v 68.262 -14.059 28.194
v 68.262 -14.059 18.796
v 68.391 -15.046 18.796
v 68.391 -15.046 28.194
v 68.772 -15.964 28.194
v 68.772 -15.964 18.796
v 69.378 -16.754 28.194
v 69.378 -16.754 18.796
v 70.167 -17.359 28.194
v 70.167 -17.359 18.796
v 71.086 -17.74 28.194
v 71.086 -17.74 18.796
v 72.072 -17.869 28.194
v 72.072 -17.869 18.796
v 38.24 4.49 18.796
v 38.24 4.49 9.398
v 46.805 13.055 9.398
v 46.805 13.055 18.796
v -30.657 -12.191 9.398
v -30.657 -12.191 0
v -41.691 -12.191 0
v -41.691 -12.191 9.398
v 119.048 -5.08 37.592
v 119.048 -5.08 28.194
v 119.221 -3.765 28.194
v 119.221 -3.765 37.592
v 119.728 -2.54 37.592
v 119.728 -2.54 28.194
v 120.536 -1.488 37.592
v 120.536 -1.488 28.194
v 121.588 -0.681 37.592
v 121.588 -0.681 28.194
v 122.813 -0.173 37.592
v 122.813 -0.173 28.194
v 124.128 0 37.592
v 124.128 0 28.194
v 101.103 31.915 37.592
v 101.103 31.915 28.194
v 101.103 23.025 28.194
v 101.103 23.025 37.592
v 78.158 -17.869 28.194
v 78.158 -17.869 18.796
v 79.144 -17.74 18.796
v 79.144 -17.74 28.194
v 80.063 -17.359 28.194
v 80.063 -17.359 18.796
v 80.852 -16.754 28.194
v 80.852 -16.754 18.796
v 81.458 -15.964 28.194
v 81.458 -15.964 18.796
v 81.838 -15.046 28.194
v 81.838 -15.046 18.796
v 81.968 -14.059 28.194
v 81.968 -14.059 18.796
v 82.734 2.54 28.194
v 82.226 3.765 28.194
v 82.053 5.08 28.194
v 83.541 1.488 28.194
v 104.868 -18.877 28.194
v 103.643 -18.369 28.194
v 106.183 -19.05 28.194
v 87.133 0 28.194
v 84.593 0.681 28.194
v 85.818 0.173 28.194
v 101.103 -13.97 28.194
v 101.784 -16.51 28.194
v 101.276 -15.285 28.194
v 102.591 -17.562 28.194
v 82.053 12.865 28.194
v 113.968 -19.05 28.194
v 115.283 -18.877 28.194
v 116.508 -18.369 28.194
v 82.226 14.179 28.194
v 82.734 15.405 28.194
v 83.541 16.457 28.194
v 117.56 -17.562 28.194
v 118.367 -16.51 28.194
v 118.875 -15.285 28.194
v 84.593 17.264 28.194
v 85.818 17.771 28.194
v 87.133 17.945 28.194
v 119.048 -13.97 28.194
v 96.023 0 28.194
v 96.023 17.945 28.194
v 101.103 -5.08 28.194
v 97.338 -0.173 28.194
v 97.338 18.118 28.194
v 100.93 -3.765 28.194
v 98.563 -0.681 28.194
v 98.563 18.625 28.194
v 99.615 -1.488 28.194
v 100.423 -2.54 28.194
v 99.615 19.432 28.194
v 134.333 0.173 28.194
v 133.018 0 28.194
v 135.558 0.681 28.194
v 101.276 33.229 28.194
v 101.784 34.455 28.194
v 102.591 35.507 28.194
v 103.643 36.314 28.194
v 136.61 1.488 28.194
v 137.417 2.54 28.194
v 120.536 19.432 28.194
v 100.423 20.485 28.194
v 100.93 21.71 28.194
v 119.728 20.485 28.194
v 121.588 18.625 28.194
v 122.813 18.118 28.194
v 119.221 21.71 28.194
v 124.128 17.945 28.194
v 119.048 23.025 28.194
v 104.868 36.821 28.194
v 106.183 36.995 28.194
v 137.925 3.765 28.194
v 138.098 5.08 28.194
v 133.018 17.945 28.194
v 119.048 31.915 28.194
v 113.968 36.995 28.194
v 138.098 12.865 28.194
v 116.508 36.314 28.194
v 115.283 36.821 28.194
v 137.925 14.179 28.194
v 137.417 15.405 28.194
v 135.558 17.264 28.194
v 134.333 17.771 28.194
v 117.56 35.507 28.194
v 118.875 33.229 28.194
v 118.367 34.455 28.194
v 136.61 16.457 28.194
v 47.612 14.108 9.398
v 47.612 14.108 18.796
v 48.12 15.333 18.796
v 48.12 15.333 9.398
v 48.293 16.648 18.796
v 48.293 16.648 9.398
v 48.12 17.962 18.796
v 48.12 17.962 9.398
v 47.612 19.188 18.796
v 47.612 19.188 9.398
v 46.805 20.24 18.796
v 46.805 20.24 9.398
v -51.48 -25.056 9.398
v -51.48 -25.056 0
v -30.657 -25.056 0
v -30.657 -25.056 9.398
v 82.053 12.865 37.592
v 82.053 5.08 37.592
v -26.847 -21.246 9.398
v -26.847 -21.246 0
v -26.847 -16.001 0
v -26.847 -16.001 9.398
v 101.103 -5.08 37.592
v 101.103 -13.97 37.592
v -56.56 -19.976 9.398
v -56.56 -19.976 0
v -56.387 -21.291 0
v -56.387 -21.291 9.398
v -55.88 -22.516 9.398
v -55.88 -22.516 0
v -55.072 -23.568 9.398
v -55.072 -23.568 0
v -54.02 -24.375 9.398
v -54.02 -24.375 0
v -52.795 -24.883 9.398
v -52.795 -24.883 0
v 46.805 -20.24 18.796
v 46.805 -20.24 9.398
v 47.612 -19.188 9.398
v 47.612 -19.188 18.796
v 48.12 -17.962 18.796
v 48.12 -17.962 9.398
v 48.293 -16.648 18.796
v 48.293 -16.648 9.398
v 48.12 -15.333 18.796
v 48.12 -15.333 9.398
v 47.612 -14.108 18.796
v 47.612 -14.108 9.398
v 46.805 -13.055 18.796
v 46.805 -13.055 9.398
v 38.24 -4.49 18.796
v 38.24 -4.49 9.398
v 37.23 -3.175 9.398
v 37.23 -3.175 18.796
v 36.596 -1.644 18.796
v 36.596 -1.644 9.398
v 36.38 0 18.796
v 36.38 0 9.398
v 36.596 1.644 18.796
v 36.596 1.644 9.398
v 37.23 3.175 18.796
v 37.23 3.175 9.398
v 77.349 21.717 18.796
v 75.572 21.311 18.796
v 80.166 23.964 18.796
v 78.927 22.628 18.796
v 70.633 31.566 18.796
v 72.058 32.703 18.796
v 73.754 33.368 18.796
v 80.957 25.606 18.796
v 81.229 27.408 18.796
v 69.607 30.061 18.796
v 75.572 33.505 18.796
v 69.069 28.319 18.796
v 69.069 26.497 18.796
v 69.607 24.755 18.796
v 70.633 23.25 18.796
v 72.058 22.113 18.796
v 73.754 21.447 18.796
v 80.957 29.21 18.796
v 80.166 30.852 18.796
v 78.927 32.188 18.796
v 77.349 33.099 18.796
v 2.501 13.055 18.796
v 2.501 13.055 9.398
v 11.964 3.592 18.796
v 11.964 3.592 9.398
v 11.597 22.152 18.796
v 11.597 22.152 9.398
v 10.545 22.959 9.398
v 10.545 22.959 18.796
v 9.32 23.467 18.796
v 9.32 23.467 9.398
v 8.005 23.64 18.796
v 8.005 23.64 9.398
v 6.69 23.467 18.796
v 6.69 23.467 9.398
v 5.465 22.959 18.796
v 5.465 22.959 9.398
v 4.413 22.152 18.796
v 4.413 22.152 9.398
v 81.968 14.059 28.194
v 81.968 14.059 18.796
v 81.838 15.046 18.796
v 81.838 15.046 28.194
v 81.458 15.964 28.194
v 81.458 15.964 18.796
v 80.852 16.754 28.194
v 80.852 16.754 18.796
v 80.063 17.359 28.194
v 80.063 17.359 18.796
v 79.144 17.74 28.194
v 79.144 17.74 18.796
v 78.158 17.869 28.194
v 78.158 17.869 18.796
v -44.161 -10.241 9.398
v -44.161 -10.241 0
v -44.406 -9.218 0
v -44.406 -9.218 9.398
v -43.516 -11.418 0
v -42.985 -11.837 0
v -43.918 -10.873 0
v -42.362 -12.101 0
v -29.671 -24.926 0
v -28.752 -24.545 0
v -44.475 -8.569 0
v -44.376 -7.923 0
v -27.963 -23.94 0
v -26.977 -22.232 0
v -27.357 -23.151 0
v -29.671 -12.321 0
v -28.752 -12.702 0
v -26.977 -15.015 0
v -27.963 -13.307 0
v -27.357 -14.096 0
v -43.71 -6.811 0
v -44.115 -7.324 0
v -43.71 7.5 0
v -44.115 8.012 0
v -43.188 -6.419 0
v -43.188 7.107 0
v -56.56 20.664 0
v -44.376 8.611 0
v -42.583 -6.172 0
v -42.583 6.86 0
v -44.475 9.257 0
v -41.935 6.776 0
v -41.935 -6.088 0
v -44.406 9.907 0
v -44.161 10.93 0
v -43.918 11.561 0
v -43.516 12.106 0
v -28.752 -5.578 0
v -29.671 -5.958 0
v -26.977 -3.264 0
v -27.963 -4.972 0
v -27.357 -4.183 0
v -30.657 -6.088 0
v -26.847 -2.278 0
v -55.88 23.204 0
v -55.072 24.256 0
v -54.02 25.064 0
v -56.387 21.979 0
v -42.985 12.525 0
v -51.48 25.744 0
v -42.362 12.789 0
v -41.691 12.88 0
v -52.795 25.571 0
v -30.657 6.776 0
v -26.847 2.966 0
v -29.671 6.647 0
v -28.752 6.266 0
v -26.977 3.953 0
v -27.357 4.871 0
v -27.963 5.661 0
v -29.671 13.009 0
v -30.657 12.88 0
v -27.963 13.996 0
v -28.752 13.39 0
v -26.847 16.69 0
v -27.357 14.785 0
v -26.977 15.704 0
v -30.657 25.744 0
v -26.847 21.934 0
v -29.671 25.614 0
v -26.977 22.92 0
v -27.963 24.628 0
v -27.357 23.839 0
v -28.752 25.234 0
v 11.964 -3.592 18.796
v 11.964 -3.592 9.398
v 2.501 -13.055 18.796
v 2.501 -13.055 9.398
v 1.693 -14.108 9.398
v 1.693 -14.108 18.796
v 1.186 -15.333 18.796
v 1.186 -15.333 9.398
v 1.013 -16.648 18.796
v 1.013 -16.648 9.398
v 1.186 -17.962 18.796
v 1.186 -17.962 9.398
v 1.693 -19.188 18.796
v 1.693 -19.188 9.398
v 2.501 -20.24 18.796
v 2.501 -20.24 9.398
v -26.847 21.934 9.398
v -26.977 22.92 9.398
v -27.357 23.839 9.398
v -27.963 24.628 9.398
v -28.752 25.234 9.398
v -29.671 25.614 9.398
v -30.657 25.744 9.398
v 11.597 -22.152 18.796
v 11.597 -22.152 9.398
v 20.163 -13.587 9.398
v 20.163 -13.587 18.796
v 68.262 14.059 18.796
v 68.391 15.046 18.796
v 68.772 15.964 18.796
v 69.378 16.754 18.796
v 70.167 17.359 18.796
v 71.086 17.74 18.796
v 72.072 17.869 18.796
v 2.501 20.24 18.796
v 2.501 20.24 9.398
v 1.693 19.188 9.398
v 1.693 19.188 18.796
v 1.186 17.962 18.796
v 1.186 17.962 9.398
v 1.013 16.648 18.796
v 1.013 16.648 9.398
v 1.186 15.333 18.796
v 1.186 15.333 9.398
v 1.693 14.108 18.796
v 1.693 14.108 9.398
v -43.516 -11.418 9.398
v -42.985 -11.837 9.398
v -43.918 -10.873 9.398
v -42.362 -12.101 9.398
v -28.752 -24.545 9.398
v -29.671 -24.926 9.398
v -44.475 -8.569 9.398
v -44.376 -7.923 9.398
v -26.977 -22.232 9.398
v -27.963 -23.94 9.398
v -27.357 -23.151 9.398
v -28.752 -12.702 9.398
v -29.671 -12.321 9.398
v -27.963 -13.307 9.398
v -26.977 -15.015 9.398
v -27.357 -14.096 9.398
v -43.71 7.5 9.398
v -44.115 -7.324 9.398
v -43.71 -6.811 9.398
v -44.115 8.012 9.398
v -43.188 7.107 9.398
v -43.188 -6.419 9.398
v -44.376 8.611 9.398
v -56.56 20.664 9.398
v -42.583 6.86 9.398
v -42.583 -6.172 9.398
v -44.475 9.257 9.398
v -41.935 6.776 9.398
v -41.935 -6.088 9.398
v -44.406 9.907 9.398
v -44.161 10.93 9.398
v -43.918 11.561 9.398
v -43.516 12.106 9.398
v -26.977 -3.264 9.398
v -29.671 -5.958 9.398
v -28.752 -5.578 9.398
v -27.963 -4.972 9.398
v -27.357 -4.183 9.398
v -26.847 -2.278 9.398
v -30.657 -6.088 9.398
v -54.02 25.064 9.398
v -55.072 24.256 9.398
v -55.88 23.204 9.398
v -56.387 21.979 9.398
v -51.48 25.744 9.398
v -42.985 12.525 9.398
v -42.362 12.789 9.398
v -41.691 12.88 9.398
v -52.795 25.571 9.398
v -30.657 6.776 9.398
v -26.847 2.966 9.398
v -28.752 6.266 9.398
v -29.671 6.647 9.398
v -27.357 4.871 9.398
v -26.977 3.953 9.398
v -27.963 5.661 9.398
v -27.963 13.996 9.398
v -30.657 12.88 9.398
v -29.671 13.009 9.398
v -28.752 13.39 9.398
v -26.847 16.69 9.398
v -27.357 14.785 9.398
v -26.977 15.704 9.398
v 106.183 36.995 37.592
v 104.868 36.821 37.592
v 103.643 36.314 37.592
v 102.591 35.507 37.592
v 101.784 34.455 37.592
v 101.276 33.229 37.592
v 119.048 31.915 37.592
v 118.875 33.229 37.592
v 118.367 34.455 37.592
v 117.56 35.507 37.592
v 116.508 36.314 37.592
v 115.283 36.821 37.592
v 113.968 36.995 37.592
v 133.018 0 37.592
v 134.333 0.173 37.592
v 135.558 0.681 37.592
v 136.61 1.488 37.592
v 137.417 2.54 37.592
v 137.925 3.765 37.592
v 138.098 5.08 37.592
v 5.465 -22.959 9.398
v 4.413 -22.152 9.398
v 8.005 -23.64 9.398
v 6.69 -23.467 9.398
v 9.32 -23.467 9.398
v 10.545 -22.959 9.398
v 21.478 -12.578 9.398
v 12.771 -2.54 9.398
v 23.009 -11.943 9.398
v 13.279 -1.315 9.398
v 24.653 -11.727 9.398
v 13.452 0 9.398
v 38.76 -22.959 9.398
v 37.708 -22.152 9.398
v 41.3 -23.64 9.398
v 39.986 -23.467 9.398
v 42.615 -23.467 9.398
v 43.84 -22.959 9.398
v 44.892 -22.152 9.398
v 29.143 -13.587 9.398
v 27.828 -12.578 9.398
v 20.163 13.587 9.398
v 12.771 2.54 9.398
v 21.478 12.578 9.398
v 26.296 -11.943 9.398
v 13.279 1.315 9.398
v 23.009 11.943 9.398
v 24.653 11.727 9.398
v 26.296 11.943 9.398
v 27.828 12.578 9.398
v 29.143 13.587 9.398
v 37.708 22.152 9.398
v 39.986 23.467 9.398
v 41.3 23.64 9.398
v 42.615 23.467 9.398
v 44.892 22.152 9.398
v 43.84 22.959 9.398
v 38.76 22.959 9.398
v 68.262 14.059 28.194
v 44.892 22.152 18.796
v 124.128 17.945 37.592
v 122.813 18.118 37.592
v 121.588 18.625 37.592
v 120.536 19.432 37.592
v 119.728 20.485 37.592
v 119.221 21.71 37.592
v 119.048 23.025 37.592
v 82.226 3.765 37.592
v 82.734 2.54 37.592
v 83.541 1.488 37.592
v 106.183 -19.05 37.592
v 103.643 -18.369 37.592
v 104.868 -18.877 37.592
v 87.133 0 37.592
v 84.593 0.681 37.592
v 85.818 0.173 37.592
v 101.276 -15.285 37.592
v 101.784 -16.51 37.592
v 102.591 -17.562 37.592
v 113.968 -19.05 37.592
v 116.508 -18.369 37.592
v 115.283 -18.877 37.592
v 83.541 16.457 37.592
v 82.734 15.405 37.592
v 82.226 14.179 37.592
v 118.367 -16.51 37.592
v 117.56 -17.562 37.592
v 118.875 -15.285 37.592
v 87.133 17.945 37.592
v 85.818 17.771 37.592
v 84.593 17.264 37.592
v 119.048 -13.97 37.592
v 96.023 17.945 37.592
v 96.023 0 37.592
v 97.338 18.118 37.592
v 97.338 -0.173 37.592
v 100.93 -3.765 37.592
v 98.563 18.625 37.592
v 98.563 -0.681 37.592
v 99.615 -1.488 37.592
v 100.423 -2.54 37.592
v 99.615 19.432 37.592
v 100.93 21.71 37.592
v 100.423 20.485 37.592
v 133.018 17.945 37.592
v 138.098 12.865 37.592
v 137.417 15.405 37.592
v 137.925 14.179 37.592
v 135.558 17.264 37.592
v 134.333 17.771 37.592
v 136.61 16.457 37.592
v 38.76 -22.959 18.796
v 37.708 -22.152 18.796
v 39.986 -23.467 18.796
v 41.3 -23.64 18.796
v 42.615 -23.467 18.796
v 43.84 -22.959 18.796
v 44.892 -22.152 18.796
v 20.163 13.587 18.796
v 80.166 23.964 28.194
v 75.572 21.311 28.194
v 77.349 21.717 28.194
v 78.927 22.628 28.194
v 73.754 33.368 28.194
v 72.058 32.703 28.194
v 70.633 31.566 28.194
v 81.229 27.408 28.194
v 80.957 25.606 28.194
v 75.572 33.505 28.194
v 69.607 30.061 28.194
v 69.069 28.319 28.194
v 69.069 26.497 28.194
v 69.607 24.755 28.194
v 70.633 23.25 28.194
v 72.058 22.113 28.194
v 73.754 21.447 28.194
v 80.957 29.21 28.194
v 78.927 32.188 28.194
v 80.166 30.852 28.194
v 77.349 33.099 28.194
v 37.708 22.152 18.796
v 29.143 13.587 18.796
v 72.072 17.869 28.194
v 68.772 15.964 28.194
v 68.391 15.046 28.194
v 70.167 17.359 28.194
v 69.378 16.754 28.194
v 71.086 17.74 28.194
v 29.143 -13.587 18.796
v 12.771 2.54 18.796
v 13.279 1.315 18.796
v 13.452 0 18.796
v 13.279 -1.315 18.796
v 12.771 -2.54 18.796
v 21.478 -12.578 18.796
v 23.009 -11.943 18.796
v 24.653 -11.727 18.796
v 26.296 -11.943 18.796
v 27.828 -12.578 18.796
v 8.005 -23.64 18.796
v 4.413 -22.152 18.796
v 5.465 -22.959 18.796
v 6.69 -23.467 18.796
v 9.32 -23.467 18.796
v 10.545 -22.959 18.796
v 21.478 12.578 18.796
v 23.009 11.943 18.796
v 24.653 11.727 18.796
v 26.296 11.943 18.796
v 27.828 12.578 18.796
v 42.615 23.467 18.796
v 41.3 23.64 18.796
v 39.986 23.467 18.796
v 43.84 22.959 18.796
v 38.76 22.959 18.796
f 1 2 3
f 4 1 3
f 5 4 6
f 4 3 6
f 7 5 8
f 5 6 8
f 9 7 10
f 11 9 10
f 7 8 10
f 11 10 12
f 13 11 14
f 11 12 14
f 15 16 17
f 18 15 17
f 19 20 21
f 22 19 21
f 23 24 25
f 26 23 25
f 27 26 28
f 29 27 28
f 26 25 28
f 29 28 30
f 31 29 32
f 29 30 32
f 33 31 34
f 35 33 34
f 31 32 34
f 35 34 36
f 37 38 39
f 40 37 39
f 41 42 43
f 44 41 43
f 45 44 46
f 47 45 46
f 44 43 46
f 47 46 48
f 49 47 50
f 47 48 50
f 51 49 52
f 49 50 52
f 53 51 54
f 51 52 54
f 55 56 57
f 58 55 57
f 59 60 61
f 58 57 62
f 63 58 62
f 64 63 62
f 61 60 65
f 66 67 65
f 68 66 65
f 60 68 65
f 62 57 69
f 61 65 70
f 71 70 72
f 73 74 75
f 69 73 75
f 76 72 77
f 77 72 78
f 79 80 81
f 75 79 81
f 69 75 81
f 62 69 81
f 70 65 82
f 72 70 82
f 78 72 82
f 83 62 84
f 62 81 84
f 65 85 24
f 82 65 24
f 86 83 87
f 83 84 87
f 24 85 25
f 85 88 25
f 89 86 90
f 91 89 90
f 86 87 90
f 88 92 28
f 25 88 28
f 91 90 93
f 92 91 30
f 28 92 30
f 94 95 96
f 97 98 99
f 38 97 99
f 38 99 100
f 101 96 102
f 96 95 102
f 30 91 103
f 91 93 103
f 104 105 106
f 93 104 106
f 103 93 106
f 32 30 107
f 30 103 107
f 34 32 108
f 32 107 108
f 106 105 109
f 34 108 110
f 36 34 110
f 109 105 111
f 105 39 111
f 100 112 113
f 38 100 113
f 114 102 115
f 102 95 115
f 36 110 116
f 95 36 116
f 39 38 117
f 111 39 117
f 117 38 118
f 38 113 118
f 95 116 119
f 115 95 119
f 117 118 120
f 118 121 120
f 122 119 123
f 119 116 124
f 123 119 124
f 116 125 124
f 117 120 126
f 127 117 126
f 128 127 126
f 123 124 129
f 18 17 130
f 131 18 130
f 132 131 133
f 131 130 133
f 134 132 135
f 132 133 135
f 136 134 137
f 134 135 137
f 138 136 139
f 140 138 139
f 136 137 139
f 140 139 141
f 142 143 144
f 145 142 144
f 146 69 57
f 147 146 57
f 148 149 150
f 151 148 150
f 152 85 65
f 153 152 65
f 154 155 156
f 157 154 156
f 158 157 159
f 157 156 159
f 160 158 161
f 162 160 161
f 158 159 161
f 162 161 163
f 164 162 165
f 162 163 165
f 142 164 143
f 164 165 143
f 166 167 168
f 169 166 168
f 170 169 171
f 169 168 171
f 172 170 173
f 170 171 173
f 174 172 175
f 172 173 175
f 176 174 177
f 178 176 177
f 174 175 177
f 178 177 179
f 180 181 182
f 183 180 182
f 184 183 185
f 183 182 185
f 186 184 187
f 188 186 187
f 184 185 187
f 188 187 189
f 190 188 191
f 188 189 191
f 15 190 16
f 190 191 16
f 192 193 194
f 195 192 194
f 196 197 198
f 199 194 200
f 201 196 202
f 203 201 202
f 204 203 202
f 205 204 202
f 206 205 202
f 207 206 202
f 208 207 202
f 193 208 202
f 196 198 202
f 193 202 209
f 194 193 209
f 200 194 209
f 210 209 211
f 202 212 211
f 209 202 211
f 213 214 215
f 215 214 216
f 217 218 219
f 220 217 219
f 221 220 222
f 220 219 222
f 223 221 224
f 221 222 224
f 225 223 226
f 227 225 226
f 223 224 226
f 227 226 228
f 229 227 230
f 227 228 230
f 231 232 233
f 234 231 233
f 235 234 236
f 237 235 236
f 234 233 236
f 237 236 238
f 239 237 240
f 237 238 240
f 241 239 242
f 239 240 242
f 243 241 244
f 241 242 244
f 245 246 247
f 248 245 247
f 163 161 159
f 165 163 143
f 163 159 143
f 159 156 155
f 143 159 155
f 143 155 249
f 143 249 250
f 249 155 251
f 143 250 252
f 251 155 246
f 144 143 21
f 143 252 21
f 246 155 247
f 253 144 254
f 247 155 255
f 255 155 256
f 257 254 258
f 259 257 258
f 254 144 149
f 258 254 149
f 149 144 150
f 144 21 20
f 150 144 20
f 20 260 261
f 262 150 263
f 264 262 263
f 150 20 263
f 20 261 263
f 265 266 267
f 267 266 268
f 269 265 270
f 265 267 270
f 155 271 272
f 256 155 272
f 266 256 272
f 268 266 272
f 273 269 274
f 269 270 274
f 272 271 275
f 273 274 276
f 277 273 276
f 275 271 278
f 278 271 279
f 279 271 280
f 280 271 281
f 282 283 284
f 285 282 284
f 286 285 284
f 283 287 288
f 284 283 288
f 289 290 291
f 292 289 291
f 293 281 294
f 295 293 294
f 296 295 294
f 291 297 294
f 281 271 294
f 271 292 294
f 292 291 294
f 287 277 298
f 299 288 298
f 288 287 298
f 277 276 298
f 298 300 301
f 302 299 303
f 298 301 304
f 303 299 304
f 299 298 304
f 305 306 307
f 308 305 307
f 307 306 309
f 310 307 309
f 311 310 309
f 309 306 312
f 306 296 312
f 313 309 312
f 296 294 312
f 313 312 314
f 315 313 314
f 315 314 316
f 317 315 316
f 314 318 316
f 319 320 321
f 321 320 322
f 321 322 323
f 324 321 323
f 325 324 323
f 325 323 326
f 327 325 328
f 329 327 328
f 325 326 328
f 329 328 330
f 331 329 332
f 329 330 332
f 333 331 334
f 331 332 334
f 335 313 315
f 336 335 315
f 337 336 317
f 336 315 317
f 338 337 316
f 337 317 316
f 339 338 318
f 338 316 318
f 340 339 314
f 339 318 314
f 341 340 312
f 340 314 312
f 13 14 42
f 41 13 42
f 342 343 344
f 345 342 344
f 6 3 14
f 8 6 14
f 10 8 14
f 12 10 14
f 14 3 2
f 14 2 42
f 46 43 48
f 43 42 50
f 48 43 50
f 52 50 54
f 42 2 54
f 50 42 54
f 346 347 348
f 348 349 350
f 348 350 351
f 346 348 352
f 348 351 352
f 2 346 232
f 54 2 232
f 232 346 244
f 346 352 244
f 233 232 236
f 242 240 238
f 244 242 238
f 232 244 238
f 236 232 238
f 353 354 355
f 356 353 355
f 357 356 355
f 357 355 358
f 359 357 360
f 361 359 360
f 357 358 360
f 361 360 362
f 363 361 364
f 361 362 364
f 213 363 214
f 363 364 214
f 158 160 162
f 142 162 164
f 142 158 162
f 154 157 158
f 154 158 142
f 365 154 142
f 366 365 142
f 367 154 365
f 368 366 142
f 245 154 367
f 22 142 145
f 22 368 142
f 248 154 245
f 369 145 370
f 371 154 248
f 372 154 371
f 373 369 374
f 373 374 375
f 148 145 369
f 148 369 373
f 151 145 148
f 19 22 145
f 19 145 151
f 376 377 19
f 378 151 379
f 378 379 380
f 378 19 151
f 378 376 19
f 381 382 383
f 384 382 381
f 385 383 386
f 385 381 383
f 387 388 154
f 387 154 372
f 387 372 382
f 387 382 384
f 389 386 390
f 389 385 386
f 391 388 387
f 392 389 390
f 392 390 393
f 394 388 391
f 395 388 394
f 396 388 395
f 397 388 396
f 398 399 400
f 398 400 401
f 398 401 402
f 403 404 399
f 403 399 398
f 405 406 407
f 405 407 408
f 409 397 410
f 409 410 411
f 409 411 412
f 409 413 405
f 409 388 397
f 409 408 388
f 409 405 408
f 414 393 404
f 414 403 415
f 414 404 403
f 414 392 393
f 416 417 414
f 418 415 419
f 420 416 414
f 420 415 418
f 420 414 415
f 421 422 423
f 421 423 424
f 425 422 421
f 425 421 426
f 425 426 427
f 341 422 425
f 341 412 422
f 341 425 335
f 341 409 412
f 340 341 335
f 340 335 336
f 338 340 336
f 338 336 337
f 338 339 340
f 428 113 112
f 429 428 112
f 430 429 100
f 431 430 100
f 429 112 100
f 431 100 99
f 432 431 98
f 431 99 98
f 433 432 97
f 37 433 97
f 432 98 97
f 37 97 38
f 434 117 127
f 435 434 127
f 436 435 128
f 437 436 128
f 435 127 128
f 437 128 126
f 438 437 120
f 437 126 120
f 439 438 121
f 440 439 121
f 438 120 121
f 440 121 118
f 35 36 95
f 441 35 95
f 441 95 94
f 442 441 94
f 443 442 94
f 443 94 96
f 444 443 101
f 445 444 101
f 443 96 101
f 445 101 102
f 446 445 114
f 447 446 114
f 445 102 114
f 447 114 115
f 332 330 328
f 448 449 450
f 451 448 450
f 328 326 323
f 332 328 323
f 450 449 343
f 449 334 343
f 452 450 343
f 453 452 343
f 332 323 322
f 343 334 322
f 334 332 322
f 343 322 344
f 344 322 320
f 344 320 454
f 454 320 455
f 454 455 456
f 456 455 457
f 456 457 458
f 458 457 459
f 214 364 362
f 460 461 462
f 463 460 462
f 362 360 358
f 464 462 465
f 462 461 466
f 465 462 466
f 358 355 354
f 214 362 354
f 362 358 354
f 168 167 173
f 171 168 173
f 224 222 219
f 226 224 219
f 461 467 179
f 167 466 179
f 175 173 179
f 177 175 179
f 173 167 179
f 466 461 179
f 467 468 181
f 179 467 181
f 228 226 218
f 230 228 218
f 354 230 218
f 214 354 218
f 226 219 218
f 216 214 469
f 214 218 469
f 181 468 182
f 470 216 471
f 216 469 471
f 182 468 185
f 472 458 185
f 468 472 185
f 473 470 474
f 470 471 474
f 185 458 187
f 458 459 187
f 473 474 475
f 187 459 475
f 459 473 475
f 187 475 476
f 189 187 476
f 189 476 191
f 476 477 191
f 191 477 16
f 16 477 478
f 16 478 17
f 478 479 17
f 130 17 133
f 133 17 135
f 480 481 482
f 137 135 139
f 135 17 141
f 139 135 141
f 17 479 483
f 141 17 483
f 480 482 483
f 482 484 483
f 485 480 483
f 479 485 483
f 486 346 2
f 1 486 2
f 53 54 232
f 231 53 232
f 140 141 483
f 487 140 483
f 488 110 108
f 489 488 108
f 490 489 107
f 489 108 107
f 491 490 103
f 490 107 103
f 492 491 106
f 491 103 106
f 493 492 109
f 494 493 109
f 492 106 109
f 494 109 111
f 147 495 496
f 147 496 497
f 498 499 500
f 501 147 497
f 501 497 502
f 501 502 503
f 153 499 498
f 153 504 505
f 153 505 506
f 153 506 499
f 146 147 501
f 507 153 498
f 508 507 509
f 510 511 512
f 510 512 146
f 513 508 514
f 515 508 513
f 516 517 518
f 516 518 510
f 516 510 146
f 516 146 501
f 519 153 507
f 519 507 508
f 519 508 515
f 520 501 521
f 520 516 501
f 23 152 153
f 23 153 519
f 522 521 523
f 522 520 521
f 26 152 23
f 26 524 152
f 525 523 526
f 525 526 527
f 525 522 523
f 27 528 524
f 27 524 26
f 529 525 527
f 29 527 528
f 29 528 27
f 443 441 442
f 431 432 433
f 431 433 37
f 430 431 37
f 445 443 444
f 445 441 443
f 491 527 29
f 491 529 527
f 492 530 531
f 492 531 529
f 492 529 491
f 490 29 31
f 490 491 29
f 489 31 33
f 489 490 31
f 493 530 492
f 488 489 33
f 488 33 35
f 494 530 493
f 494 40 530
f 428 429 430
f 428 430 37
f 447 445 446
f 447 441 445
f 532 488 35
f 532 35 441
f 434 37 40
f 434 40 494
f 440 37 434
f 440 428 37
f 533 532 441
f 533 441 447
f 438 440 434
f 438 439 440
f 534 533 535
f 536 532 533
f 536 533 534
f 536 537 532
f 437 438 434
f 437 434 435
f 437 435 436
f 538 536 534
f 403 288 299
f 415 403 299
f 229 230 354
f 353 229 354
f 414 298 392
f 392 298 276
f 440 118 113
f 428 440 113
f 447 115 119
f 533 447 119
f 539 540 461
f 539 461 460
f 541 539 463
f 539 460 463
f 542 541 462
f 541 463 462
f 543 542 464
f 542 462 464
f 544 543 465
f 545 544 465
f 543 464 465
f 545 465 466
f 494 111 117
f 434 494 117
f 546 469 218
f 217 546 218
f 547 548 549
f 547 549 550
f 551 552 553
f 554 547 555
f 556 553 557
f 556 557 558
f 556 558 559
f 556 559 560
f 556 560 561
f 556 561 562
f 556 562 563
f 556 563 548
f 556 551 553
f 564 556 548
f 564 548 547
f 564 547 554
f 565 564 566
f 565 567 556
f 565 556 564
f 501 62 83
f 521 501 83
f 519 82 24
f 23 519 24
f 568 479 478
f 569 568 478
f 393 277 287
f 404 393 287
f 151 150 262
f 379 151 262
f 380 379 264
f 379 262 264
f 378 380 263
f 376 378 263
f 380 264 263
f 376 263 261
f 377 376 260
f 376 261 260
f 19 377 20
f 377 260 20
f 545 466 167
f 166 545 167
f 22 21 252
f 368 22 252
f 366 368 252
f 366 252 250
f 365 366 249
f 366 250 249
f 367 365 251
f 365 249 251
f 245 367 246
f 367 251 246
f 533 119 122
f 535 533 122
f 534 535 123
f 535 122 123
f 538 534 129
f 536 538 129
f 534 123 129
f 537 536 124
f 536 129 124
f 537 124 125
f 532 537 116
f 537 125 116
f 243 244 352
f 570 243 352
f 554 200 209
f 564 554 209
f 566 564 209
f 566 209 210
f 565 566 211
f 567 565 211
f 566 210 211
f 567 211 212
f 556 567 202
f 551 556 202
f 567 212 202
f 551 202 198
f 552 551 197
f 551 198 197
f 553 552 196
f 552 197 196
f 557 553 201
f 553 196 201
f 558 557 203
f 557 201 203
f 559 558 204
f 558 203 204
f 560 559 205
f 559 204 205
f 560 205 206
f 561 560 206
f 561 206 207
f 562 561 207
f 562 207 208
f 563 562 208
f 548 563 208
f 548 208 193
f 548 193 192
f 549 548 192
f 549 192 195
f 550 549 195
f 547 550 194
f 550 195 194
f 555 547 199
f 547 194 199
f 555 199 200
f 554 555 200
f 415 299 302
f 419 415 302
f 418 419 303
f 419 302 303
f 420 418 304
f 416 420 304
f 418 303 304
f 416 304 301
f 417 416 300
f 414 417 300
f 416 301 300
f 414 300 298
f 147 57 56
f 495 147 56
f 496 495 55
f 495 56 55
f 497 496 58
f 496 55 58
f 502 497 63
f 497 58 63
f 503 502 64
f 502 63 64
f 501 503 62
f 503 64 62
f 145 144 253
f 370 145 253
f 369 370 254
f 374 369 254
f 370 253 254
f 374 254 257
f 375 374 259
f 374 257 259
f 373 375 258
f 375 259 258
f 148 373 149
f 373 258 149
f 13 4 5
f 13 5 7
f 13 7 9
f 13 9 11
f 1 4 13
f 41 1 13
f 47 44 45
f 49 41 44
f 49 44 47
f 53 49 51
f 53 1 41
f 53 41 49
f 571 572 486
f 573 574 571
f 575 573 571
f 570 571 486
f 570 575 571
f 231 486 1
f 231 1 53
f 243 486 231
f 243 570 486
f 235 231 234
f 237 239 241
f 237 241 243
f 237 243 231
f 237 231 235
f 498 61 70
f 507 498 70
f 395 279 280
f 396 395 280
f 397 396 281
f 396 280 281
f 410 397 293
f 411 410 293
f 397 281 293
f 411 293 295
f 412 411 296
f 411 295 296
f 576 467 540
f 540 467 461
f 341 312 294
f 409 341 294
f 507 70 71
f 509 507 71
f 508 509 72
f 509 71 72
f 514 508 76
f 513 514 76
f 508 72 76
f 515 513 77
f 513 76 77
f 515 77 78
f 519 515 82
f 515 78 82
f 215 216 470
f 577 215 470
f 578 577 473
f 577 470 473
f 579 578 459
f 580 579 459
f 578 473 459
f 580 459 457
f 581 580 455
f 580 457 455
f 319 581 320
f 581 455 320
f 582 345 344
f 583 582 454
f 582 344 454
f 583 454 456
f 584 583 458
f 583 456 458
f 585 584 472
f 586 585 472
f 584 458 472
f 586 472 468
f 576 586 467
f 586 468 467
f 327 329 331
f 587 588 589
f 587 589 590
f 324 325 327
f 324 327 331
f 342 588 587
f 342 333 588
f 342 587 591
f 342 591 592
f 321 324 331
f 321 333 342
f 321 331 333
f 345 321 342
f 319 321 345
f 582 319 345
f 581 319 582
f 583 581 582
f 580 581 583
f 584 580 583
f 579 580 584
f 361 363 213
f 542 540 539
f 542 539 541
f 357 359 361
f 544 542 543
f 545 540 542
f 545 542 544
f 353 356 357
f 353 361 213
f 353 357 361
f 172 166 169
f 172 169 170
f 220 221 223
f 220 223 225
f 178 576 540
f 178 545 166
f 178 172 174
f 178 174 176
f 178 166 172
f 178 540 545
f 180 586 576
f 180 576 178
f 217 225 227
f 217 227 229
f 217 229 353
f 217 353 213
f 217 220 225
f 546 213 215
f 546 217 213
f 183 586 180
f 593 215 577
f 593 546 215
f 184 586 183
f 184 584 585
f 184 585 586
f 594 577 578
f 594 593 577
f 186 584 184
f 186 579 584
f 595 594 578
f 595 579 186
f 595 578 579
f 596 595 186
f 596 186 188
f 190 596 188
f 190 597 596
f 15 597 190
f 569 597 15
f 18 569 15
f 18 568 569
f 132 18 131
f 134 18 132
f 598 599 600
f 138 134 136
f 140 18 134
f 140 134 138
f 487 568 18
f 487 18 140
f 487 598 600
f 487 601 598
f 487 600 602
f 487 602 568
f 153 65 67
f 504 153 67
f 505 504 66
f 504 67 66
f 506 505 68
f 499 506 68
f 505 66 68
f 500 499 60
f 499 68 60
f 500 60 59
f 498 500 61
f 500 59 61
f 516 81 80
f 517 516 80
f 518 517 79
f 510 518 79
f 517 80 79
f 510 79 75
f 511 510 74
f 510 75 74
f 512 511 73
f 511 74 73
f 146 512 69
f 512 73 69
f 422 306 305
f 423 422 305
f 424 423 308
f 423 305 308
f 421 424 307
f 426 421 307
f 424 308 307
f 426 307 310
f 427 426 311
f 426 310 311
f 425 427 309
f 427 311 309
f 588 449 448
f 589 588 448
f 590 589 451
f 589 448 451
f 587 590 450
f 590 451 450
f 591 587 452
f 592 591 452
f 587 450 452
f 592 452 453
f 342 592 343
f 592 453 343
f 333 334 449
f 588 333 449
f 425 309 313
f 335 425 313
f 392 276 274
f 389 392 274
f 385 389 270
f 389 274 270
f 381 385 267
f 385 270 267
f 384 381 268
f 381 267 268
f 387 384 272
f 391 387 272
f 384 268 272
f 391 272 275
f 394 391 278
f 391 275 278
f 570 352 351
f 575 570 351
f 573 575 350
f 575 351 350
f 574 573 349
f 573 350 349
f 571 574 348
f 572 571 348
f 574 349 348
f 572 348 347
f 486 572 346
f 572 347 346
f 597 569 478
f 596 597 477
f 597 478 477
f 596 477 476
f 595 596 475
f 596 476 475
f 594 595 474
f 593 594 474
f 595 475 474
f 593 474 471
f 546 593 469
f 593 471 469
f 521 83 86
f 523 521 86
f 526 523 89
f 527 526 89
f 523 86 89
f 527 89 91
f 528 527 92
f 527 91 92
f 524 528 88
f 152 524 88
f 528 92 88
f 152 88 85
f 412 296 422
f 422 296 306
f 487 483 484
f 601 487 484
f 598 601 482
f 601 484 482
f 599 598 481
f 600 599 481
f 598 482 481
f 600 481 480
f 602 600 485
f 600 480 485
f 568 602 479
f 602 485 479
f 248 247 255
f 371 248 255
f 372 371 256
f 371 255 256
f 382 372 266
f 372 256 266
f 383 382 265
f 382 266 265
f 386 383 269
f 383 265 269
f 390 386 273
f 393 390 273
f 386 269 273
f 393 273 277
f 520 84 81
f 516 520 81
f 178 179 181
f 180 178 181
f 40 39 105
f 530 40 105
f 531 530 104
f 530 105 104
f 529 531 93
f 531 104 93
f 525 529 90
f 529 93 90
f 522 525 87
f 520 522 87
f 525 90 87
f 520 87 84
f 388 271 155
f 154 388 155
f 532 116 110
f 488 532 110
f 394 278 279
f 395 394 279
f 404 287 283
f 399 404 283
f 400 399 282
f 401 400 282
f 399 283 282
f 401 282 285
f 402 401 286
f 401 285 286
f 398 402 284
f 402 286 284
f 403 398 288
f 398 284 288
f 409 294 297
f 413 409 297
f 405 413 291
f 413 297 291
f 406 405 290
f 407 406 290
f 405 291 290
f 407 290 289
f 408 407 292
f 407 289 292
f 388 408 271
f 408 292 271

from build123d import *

# Parameters (mm, degrees)
F1_DEPTH = 9.398
F3_DEPTH = 9.398
F5_DEPTH = 9.398
F4_R     = 6.113799
F6_DEPTH = 9.398
F8_DEPTH = 9.398


with BuildPart() as f1:
    # F0 (on Top) → F1 (new body)
    with BuildSketch(Plane.XY):
        with BuildLine():
            Line((-56.560311, 20.664202), (-56.560311, 0.344202))
            Line((-56.560311, 0.344202), (-56.560311, -19.975798))
            ThreePointArc((-56.560311, -19.975798), (-55.072414, -23.5679), (-51.480311, -25.055798))
            Line((-51.480311, -25.055798), (-30.656733, -25.055798))
            ThreePointArc((-30.656733, -25.055798), (-27.962656, -23.939875), (-26.846733, -21.245798))
            Line((-26.846733, -21.245798), (-26.846733, -16.001206))
            ThreePointArc((-26.846733, -16.001206), (-27.962656, -13.307129), (-30.656733, -12.191206))
            Line((-30.656733, -12.191206), (-41.690991, -12.191206))
            ThreePointArc((-41.690991, -12.191206), (-43.264629, -11.645012), (-44.161486, -10.241334))
            Line((-44.161486, -10.241334), (-44.405878, -9.218222))
            ThreePointArc((-44.405878, -9.218222), (-43.929189, -7.054456), (-41.935382, -6.088094))
            Line((-41.935382, -6.088094), (-30.656733, -6.088094))
            ThreePointArc((-30.656733, -6.088094), (-27.962656, -4.97217), (-26.846733, -2.278094))
            Line((-26.846733, -2.278094), (-26.846733, 2.966498))
            ThreePointArc((-26.846733, 2.966498), (-27.962656, 5.660575), (-30.656733, 6.776498))
            Line((-30.656733, 6.776498), (-41.935383, 6.776498))
            ThreePointArc((-41.935383, 6.776498), (-43.929189, 7.74286), (-44.405879, 9.906626))
            Line((-44.405879, 9.906626), (-44.161486, 10.929747))
            ThreePointArc((-44.161486, 10.929747), (-43.264629, 12.333425), (-41.69099, 12.879619))
            Line((-41.69099, 12.879619), (-30.656733, 12.879619))
            ThreePointArc((-30.656733, 12.879619), (-27.962656, 13.995542), (-26.846733, 16.689619))
            Line((-26.846733, 16.689619), (-26.846733, 21.934202))
            ThreePointArc((-26.846733, 21.934202), (-27.962656, 24.628279), (-30.656733, 25.744202))
            Line((-30.656733, 25.744202), (-51.480311, 25.744202))
            ThreePointArc((-51.480311, 25.744202), (-55.072414, 24.256305), (-56.560311, 20.664202))
        make_face()
    extrude(amount=F1_DEPTH)


with BuildPart() as f3:
    # F2 (on face) → F3 (new body)
    with BuildSketch(Plane.XY.offset(9.398)):
        with BuildLine():
            ThreePointArc((11.5973, 22.1521), (8.005198, 23.639997), (4.413095, 22.1521))
            Line((4.413095, 22.1521), (2.50066, 20.239664))
            ThreePointArc((2.50066, 20.239664), (1.012762, 16.647562), (2.50066, 13.05546))
            Line((2.50066, 13.05546), (11.964017, 3.592102))
            ThreePointArc((11.964017, 3.592102), (13.451915, 0), (11.964017, -3.592102))
            Line((11.964017, -3.592102), (2.50066, -13.05546))
            ThreePointArc((2.50066, -13.05546), (1.012762, -16.647562), (2.50066, -20.239664))
            Line((2.50066, -20.239664), (4.413095, -22.1521))
            ThreePointArc((4.413095, -22.1521), (8.005198, -23.639997), (11.5973, -22.1521))
            Line((11.5973, -22.1521), (20.162632, -13.586768))
            ThreePointArc((20.162632, -13.586768), (24.65276, -11.726896), (29.142888, -13.586768))
            Line((29.142888, -13.586768), (37.708219, -22.1521))
            ThreePointArc((37.708219, -22.1521), (41.300322, -23.639997), (44.892424, -22.1521))
            Line((44.892424, -22.1521), (46.80486, -20.239664))
            ThreePointArc((46.80486, -20.239664), (48.292757, -16.647562), (46.80486, -13.05546))
            Line((46.80486, -13.05546), (38.239528, -4.490128))
            ThreePointArc((38.239528, -4.490128), (36.379656, 0), (38.239528, 4.490128))
            Line((38.239528, 4.490128), (46.80486, 13.05546))
            ThreePointArc((46.80486, 13.05546), (48.292757, 16.647562), (46.80486, 20.239664))
            Line((46.80486, 20.239664), (44.892424, 22.1521))
            ThreePointArc((44.892424, 22.1521), (41.300322, 23.639997), (37.708219, 22.1521))
            Line((37.708219, 22.1521), (29.142888, 13.586768))
            ThreePointArc((29.142888, 13.586768), (24.65276, 11.726896), (20.162632, 13.586768))
            Line((20.162632, 13.586768), (11.5973, 22.1521))
        make_face()
    extrude(amount=F3_DEPTH)


with BuildPart() as f5:
    # F4 (on face) → F5 (new body)
    with BuildSketch(Plane.XY.offset(18.796)):
        with BuildLine():
            Line((78.158188, 17.869434), (72.071638, 17.869434))
            ThreePointArc((72.071638, 17.869434), (69.377561, 16.753511), (68.261638, 14.059434))
            Line((68.261638, 14.059434), (68.261638, -14.059434))
            ThreePointArc((68.261638, -14.059434), (69.377561, -16.753511), (72.071638, -17.869434))
            Line((72.071638, -17.869434), (78.158188, -17.869434))
            ThreePointArc((78.158188, -17.869434), (80.852265, -16.753511), (81.968188, -14.059434))
            Line((81.968188, -14.059434), (81.968188, 14.059434))
            ThreePointArc((81.968188, 14.059434), (80.852265, 16.753511), (78.158188, 17.869434))
        make_face()
    extrude(amount=F5_DEPTH)


with BuildPart() as f6:
    # F4 (on face) → F6 (new body)
    with BuildSketch(Plane.XY.offset(18.796)):
        with Locations((75.114913, 27.407957)):
            Circle(F4_R)
    extrude(amount=F6_DEPTH)


with BuildPart() as f8:
    # F7 (on face) → F8 (new body)
    with BuildSketch(Plane.XY.offset(28.194)):
        with BuildLine():
            ThreePointArc((106.183127, 36.994592), (102.591025, 35.506694), (101.103127, 31.914592))
            Line((101.103127, 31.914592), (101.103127, 23.024592))
            ThreePointArc((101.103127, 23.024592), (99.615229, 19.43249), (96.023127, 17.944592))
            Line((96.023127, 17.944592), (87.133127, 17.944592))
            ThreePointArc((87.133127, 17.944592), (83.541025, 16.456694), (82.053127, 12.864592))
            Line((82.053127, 12.864592), (82.053127, 5.08))
            ThreePointArc((82.053127, 5.08), (83.541025, 1.487898), (87.133127, 0))
            Line((87.133127, 0), (96.023127, 0))
            ThreePointArc((96.023127, 0), (99.615229, -1.487898), (101.103127, -5.08))
            Line((101.103127, -5.08), (101.103127, -13.97))
            ThreePointArc((101.103127, -13.97), (102.591025, -17.562102), (106.183127, -19.05))
            Line((106.183127, -19.05), (113.967719, -19.05))
            ThreePointArc((113.967719, -19.05), (117.559821, -17.562102), (119.047719, -13.97))
            Line((119.047719, -13.97), (119.047719, -5.08))
            ThreePointArc((119.047719, -5.08), (120.535617, -1.487898), (124.127719, 0))
            Line((124.127719, 0), (133.017719, 0))
            ThreePointArc((133.017719, 0), (136.609821, 1.487898), (138.097719, 5.08))
            Line((138.097719, 5.08), (138.097719, 12.864592))
            ThreePointArc((138.097719, 12.864592), (136.609821, 16.456694), (133.017719, 17.944592))
            Line((133.017719, 17.944592), (124.127719, 17.944592))
            ThreePointArc((124.127719, 17.944592), (120.535617, 19.43249), (119.047719, 23.024592))
            Line((119.047719, 23.024592), (119.047719, 31.914592))
            ThreePointArc((119.047719, 31.914592), (117.559821, 35.506694), (113.967719, 36.994592))
            Line((113.967719, 36.994592), (106.183127, 36.994592))
        make_face()
    extrude(amount=F8_DEPTH)


solid = Compound([f1.part, f3.part, f5.part, f6.part, f8.part])
